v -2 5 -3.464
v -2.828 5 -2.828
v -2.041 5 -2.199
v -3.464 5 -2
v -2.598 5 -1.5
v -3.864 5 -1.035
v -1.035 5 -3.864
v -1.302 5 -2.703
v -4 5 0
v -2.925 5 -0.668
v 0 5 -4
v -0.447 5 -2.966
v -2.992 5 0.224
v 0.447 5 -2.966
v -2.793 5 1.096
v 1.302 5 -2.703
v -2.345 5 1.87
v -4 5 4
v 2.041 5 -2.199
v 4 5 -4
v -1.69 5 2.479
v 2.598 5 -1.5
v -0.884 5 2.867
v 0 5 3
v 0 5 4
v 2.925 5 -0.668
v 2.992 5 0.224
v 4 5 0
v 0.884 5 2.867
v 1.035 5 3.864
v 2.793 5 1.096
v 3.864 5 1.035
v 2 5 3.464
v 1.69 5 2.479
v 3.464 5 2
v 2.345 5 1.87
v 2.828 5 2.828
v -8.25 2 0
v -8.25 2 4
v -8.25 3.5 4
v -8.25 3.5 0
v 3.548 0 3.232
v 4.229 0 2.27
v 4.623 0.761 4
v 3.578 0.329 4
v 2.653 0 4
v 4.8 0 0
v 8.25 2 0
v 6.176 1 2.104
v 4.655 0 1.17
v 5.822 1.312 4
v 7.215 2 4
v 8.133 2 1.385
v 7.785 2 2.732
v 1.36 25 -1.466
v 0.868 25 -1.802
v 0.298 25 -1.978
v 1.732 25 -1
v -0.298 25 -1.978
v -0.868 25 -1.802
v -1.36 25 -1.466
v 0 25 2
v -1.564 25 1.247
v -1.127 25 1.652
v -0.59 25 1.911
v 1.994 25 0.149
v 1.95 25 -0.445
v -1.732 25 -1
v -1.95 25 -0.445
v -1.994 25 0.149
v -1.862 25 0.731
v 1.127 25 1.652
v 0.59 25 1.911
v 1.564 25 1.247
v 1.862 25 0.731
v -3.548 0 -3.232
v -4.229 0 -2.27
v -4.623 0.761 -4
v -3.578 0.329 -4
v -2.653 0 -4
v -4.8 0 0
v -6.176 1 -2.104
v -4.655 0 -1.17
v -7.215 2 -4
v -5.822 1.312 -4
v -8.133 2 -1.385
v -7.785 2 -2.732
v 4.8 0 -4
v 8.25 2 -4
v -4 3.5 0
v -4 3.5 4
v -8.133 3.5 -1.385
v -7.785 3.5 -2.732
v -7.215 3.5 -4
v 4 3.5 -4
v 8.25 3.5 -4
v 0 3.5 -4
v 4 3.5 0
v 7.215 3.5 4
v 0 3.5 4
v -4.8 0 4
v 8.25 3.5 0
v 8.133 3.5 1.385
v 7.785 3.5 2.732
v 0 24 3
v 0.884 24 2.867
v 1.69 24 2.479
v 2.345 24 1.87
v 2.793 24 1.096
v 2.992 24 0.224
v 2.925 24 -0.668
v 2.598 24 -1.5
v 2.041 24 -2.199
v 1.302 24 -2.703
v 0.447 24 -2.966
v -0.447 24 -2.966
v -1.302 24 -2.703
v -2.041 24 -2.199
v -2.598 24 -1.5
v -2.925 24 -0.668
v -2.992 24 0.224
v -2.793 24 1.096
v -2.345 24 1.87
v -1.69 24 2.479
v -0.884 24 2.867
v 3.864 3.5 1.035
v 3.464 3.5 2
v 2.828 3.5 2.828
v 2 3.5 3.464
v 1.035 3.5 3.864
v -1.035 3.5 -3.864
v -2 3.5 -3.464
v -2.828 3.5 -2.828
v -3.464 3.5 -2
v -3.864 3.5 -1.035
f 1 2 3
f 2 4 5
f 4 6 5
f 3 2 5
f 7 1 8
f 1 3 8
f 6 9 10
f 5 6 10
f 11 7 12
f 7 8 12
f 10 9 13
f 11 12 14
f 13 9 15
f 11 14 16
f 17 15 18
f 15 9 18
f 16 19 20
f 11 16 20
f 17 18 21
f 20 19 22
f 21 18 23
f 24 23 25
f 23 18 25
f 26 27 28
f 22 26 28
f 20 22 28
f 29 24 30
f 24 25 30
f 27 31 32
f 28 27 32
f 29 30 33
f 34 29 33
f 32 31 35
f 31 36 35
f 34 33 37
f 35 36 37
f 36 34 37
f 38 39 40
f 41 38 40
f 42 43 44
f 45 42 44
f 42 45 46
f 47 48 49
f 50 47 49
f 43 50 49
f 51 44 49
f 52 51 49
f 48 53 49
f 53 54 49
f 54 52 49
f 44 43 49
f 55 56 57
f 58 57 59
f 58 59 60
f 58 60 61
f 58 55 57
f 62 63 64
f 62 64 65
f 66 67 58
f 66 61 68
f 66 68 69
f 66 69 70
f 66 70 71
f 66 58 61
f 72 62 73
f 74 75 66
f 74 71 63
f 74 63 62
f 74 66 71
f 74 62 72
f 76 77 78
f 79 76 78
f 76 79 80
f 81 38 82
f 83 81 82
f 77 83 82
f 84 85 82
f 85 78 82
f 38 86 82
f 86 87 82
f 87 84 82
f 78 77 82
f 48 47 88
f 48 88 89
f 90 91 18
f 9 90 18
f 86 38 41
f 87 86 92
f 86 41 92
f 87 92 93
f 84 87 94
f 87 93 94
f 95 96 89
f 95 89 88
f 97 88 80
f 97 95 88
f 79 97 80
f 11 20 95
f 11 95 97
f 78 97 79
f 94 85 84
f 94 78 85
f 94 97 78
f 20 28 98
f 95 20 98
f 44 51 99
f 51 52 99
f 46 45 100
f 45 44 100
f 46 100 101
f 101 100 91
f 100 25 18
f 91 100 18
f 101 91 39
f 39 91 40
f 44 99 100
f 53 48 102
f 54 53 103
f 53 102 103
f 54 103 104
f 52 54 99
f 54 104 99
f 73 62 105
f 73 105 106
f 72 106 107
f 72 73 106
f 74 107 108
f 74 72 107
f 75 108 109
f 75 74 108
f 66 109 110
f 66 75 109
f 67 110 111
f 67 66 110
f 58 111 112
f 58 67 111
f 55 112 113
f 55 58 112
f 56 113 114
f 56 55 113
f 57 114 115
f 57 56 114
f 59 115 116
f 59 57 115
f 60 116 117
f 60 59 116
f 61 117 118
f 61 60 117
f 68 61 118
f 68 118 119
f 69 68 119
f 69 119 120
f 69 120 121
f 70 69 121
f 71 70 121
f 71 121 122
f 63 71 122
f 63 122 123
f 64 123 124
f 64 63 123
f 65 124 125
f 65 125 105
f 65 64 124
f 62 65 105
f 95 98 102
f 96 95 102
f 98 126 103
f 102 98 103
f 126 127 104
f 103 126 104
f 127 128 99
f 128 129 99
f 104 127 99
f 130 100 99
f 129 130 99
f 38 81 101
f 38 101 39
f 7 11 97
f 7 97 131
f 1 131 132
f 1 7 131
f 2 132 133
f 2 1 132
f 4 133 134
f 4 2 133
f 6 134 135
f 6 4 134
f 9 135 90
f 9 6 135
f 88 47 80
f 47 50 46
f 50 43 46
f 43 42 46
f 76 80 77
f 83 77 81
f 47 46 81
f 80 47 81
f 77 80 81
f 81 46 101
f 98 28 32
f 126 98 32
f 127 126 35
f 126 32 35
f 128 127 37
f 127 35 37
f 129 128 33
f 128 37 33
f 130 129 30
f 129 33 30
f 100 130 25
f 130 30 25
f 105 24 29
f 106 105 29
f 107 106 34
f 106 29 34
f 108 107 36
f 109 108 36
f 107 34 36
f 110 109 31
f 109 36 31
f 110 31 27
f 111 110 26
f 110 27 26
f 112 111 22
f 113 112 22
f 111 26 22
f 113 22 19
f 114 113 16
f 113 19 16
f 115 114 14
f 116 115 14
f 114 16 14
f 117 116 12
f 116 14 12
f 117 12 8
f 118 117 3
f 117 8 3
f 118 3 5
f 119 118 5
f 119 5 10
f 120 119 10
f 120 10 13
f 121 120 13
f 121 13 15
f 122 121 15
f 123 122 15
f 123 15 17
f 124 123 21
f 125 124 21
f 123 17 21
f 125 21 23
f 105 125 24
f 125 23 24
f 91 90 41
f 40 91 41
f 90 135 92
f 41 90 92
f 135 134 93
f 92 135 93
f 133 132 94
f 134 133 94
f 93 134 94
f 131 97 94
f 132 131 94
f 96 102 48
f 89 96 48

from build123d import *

# Parameters (mm, degrees)
EXTRUDE_1_DEPTH     = 4
SKETCH_2_R          = 3
EXTRUDE_2_DEPTH     = 20
CUT_EXTRUDE_1_DEPTH = 1.5
CUT_EXTRUDE_2_DEPTH = 4.5
CHAMFER_2_SIZE      = 1


with BuildPart() as part:
    # Эскиз1 → Бобышка-Вытянуть1 (new body, symmetric)
    with BuildSketch(Plane.XY):
        Polygon((8.25, 0), (-8.25, 0), (-8.25, 3.5), (-4, 3.5), (-4, 5), (4, 5), (4, 3.5), (8.25, 3.5), align=None)
    extrude(amount=EXTRUDE_1_DEPTH, both=True)

    # Эскиз2 → Бобышка-Вытянуть2 (add)
    with BuildSketch(Plane(origin=(0, 5, 0), x_dir=(1, 0, 0), z_dir=(0, 1, 0))):
        with Locations(Location((0, 0, 0), (0, 0, 270))):  # turned: the seam where the file's is
            Circle(SKETCH_2_R)
    extrude(amount=EXTRUDE_2_DEPTH)

    # Эскиз3 → Вырез-Вытянуть1 (cut)
    with BuildSketch(Plane(origin=(0, 5, 0), x_dir=(1, 0, 0), z_dir=(0, 1, 0))):
        with BuildLine():
            Line((-4, 0), (-4, 4))
            Line((-4, 4), (0, 4))
            ThreePointArc((0, 4), (-2.828427125, 2.828427125), (-4, 0))
        make_face()
        with BuildLine():
            Line((0, -4), (4, -4))
            Line((4, -4), (4, 0))
            ThreePointArc((4, 0), (2.828427125, -2.828427125), (0, -4))
        make_face()
    extrude(amount=-CUT_EXTRUDE_1_DEPTH, mode=Mode.SUBTRACT)

    # Эскиз4 → Вырез-Вытянуть2 (cut, through all)
    with BuildSketch(Plane(origin=(0, 3.5, 0), x_dir=(1, 0, 0), z_dir=(0, 1, 0))):
        with BuildLine():
            Line((-7.215434845, 4), (-8.25, 4))
            Line((-8.25, 4), (-8.25, 0))
            ThreePointArc((-8.25, 0), (-7.987172136, 2.065812495), (-7.215434845, 4))
        make_face()
        with BuildLine():
            Line((7.215434845, -4), (8.25, -4))
            Line((8.25, -4), (8.25, 0))
            ThreePointArc((8.25, 0), (7.987172136, -2.065812495), (7.215434845, -4))
        make_face()
    extrude(amount=-CUT_EXTRUDE_2_DEPTH, mode=Mode.SUBTRACT)

    # Вырез-По траектории1: sweep along a path in Эскиз6
    with BuildLine(Plane.XZ) as sweep_1_path:
        Line((0, -8.25), (8.25, -8.25))
        Line((8.25, -8.25), (8.25, 0))
        ThreePointArc((8.25, 0), (5.833630945, 5.833630945), (0, 8.25))
        Line((0, 8.25), (-8.25, 8.25))
        Line((-8.25, 8.25), (-8.25, 0))
        ThreePointArc((-8.25, 0), (-5.833630945, -5.833630945), (0, -8.25))
    # Эскиз5 → Вырез-По траектории1 (sweep, cut)
    with BuildSketch(Plane.XY.offset(4)):
        Polygon((-8.25, 2), (-4.8, 0), (-8.25, 0), align=None)
    sweep(path=sweep_1_path.line, transition=Transition.RIGHT, mode=Mode.SUBTRACT)

    # Фаска2
    chamfer_2_edges = [part.edges().sort_by_distance(p)[0] for p in [
        (0, 25, -3),
    ]]
    chamfer(chamfer_2_edges, length=CHAMFER_2_SIZE)


solid = part.part
